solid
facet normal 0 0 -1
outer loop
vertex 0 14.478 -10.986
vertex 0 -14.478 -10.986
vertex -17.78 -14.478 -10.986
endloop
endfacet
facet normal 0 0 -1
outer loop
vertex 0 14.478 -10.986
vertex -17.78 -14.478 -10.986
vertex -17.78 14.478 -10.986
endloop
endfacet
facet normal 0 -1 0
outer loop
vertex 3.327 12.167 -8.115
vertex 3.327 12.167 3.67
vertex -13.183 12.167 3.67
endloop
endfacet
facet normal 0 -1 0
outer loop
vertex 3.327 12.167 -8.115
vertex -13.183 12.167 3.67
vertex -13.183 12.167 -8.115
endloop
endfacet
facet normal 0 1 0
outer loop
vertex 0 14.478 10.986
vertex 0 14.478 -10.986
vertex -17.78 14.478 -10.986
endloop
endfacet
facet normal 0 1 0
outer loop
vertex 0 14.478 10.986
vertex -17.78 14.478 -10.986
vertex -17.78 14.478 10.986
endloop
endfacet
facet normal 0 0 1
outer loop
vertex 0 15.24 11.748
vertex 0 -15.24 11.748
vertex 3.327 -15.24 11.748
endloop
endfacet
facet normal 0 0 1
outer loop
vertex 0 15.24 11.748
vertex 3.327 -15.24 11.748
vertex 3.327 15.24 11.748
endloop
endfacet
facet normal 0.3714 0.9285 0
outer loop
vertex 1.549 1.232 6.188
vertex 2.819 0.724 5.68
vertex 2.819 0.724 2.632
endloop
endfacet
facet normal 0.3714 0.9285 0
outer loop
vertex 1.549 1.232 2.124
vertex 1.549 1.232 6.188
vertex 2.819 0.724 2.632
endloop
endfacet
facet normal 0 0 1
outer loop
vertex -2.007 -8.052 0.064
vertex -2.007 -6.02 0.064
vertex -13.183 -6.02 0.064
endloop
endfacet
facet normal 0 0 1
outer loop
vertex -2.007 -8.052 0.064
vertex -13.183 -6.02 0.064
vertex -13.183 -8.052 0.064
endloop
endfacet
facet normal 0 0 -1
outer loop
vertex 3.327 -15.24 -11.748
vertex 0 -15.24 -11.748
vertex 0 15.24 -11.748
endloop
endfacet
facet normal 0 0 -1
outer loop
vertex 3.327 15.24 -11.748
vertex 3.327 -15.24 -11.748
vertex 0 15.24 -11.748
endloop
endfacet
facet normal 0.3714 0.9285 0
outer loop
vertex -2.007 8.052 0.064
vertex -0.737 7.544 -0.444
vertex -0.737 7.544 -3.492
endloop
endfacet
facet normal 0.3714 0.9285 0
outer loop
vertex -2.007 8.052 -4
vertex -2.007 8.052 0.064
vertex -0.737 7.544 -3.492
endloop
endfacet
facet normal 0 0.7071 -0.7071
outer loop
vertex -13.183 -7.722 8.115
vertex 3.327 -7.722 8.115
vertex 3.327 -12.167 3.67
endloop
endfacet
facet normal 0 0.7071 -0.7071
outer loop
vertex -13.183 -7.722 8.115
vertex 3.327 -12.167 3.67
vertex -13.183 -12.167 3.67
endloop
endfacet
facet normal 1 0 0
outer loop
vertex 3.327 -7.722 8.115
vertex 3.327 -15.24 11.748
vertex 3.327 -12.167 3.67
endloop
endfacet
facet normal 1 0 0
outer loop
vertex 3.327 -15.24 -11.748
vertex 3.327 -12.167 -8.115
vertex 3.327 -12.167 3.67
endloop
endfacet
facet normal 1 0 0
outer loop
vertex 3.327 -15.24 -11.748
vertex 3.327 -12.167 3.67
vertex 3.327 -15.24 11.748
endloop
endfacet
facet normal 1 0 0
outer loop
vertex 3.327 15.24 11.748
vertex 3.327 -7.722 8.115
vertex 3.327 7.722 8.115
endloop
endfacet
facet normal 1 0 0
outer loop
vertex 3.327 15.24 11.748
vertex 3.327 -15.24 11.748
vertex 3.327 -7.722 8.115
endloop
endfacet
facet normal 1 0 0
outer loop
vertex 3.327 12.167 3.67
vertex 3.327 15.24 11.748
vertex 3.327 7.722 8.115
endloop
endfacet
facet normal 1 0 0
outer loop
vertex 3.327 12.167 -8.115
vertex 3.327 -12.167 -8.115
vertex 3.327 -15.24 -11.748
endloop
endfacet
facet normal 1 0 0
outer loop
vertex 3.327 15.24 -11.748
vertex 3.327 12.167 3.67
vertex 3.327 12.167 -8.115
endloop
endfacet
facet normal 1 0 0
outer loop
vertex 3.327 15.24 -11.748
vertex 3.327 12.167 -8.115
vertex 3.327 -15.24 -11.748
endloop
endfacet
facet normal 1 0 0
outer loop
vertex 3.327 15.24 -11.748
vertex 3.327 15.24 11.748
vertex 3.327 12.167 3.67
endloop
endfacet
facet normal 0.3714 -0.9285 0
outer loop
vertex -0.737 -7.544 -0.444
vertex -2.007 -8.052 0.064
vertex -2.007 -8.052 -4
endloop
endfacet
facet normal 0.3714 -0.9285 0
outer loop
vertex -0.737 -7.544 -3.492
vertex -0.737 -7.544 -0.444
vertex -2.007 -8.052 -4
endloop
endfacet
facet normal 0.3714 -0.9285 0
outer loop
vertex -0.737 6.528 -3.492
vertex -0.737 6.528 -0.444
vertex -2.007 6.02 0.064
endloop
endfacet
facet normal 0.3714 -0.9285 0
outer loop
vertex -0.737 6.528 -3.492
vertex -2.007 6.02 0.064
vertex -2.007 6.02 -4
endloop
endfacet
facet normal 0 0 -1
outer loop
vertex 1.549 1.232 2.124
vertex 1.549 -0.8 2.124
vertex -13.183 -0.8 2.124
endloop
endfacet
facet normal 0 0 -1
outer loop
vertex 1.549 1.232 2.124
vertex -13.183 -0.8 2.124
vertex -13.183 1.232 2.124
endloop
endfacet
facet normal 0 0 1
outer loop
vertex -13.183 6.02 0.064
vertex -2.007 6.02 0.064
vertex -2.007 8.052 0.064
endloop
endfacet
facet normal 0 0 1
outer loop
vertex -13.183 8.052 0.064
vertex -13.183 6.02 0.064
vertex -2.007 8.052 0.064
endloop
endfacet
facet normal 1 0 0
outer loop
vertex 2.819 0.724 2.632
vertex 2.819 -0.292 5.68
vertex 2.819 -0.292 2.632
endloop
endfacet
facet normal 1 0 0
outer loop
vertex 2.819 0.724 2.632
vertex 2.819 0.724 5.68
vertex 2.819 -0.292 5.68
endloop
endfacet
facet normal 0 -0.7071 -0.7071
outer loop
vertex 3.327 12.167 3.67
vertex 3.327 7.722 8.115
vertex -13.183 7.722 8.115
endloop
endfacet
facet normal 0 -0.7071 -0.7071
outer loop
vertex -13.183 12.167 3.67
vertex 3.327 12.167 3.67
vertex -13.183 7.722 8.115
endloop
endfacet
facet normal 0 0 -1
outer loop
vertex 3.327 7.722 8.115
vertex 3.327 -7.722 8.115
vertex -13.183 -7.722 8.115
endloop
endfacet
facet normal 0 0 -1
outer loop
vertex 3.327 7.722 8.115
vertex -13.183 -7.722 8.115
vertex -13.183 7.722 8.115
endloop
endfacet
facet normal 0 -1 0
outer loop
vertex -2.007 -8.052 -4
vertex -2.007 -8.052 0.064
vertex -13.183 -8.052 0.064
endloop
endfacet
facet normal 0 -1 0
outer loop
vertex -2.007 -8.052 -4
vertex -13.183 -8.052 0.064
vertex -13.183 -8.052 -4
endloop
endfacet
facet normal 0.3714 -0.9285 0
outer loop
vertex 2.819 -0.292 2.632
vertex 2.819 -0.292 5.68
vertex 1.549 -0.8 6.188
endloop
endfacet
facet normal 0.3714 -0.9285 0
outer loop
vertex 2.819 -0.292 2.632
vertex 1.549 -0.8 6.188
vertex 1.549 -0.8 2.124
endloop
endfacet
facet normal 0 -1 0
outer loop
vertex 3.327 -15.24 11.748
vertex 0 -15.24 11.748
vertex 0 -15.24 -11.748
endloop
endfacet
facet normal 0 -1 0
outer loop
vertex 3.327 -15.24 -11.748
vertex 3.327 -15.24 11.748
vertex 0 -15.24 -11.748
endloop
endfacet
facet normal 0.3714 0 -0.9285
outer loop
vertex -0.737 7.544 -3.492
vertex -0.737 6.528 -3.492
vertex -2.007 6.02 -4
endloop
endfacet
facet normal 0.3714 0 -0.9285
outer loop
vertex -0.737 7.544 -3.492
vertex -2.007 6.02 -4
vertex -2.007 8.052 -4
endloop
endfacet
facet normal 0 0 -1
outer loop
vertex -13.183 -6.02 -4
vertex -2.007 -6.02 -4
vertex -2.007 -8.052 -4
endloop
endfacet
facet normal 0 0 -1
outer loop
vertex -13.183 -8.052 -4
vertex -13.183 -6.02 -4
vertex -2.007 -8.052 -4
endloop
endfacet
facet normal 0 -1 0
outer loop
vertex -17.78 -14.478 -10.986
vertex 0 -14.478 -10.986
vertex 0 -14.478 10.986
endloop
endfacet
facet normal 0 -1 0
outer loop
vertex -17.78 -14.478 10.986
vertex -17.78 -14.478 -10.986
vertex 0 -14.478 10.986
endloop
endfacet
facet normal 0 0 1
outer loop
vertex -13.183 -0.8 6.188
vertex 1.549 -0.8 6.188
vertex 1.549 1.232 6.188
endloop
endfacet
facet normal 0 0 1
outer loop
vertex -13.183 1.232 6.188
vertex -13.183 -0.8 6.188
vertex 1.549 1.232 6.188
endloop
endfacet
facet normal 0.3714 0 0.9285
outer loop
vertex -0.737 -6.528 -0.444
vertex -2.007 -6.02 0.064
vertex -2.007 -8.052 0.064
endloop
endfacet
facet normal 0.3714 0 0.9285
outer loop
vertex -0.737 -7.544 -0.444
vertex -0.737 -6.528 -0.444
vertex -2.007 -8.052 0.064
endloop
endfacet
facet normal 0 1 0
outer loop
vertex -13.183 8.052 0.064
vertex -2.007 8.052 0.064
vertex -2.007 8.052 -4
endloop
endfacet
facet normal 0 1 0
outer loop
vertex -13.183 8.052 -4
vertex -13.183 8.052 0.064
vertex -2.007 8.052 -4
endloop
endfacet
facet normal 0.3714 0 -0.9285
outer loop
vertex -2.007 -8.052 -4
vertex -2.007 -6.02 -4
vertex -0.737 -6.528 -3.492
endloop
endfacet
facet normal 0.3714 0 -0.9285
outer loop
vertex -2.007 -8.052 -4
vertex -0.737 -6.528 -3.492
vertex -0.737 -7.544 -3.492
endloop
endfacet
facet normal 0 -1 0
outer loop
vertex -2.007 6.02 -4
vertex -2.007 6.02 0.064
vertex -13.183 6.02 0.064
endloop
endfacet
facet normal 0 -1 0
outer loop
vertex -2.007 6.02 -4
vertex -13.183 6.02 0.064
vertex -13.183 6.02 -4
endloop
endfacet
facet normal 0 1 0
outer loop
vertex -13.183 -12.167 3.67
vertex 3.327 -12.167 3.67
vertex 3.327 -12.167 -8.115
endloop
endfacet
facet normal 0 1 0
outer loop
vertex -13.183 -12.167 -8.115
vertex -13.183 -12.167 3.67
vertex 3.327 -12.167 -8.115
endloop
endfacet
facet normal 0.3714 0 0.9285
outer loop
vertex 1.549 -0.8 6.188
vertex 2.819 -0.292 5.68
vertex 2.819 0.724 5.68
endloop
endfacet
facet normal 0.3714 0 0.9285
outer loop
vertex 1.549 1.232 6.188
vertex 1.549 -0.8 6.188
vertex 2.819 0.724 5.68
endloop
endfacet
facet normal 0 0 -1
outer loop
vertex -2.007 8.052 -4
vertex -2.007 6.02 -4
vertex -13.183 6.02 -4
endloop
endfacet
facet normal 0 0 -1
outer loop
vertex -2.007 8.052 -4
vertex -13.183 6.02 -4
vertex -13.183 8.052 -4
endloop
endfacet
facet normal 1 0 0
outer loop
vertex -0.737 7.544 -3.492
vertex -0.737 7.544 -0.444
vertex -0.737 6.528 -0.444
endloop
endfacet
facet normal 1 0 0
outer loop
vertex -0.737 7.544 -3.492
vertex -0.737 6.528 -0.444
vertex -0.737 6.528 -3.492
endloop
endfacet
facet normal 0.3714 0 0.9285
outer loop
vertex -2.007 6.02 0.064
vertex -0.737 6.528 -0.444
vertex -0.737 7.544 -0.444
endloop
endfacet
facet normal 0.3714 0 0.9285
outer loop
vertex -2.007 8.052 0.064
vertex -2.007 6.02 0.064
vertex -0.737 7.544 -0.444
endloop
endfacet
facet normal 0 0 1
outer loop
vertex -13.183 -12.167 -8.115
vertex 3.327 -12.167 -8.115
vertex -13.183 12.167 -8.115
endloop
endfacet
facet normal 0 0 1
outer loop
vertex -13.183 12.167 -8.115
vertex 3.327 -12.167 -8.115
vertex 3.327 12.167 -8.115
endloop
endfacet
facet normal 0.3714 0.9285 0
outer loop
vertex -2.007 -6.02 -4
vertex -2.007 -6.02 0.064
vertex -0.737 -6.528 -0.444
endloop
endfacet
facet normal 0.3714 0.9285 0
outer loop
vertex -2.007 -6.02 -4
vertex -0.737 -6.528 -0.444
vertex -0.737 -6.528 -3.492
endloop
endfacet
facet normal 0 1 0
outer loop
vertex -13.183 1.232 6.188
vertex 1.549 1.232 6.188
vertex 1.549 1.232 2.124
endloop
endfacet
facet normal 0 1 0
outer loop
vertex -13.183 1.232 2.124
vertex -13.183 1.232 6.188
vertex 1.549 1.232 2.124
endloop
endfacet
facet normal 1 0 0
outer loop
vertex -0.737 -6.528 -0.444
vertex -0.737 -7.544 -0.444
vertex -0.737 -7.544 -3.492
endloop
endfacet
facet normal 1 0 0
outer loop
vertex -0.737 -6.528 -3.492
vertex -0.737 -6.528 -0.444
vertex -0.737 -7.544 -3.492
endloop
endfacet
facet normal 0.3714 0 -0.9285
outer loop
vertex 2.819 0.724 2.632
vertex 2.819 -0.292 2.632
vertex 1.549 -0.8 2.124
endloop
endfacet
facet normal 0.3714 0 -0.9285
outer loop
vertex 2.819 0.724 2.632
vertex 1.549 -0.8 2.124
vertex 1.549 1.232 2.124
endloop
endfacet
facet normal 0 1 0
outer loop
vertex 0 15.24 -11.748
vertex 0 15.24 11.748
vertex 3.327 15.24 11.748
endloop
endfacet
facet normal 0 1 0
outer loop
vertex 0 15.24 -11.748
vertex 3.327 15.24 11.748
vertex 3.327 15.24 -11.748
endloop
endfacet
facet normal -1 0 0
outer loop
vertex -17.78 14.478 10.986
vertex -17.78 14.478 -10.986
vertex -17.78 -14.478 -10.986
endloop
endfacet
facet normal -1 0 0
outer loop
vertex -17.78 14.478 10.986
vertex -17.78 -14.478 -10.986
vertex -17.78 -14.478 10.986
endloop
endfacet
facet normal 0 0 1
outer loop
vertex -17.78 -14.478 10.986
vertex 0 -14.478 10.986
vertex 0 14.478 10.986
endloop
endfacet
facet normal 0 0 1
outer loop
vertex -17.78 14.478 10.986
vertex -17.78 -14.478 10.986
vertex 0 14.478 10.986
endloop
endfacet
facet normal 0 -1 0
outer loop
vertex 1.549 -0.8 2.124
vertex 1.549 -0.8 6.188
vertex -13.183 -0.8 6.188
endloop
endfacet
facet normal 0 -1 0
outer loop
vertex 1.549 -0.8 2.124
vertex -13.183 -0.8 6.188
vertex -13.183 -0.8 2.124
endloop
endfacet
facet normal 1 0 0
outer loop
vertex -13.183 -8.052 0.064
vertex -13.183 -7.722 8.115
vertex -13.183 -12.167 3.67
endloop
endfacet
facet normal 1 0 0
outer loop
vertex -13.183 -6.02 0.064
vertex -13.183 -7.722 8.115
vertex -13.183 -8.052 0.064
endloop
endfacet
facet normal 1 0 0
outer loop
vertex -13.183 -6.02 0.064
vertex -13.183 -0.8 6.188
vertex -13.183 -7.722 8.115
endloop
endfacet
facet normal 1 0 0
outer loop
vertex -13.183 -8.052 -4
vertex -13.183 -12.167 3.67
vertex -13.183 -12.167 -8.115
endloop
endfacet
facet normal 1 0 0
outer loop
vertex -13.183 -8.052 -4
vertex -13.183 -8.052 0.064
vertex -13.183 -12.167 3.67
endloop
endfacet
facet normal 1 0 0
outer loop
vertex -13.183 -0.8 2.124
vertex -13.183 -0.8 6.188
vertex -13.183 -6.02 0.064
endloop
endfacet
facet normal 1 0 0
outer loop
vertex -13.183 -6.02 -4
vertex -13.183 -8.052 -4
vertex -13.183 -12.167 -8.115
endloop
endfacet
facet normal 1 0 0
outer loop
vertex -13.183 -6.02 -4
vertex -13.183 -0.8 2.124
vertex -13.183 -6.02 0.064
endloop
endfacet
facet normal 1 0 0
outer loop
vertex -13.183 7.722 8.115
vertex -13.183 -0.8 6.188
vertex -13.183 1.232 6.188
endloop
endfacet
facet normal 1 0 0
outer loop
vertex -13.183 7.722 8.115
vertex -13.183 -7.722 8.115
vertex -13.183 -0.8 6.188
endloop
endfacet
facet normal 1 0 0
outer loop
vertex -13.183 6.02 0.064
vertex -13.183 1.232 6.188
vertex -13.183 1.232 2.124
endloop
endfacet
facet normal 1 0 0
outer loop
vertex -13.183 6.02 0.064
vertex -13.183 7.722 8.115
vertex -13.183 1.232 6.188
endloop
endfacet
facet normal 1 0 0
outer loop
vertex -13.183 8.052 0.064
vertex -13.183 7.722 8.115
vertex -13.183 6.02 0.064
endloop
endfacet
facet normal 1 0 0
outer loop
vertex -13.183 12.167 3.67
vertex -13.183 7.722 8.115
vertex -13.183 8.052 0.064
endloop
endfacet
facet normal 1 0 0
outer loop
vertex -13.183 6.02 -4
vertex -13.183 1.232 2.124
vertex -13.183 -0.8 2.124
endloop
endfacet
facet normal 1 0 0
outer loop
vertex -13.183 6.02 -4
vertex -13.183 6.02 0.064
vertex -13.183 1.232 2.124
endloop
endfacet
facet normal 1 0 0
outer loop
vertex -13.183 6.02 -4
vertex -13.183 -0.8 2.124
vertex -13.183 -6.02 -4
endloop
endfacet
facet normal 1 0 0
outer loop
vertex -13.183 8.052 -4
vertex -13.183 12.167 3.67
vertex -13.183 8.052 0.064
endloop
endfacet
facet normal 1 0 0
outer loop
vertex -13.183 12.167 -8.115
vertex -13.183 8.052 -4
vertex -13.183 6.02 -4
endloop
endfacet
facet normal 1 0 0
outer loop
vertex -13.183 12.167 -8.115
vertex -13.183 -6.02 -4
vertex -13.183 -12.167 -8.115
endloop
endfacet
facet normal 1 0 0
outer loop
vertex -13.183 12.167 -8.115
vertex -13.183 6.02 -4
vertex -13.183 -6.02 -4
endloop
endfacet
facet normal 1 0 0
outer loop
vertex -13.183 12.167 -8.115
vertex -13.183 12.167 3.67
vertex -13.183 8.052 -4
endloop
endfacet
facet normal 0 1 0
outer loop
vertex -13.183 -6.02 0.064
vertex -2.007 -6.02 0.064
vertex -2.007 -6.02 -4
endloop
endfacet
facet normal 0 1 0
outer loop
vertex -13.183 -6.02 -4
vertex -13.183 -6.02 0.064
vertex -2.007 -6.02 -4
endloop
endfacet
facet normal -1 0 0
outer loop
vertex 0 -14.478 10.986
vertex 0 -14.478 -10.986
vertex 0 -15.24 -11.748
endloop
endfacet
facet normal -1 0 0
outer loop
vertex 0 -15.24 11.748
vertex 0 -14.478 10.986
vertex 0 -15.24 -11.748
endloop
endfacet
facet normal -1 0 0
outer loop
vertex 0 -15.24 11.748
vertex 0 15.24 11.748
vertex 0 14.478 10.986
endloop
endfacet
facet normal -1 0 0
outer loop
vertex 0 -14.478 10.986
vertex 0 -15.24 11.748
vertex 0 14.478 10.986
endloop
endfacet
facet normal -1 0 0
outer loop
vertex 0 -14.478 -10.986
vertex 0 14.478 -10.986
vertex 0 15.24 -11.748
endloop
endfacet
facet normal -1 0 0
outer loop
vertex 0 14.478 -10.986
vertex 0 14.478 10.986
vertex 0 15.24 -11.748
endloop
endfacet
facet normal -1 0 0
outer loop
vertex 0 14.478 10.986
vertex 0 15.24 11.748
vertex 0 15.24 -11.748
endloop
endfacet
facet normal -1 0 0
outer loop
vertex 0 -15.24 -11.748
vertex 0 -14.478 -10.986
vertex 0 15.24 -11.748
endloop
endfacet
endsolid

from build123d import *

# Parameters (mm, degrees)
SKETCH1_W             = 23.495
SKETCH1_H             = 30.48
BOSS_EXTRUDE1_DEPTH   = 3.3274
SKETCH2_W             = 21.971
SKETCH2_H             = 28.956
BOSS_EXTRUDE2_DEPTH   = 17.78
SKETCH3_W             = 16.2306
SKETCH3_H             = 24.3332
CUT_EXTRUDE1_DEPTH    = 16.51
CHAMFER1_SIZE         = 4.445
SKETCH4_W             = 4.064
SKETCH4_H             = 2.032
BOSS_EXTRUDE3_DEPTH   = 16.002
CHAMFER2_SIZE         = 1.27
CHAMFER2_SIZE2        = 0.508
CHAMFER2_PART_2_SIZE  = 1.27
CHAMFER2_PART_2_SIZE2 = 0.508
CHAMFER3_SIZE         = 1.27
CHAMFER3_SIZE2        = 0.508
CHAMFER3_PART_2_SIZE  = 1.27
CHAMFER3_PART_2_SIZE2 = 0.508
SKETCH5_W             = 4.064
SKETCH5_H             = 2.032
BOSS_EXTRUDE4_DEPTH   = 12.446
CHAMFER4_SIZE         = 1.27
CHAMFER4_SIZE2        = 0.508
CHAMFER4_PART_2_SIZE  = 1.27
CHAMFER4_PART_2_SIZE2 = 0.508
CHAMFER4_PART_3_SIZE  = 1.27
CHAMFER4_PART_3_SIZE2 = 0.508
CHAMFER4_PART_4_SIZE  = 1.27
CHAMFER4_PART_4_SIZE2 = 0.508
CHAMFER5_SIZE         = 0.508
CHAMFER5_SIZE2        = 1.27


with BuildPart() as part:
    # Sketch1 → Boss-Extrude1 (new body)
    with BuildSketch(Plane(origin=(0, 0, 0), x_dir=(0, 0, -1), z_dir=(1, 0, 0))):
        Rectangle(SKETCH1_W, SKETCH1_H)
    extrude(amount=BOSS_EXTRUDE1_DEPTH)

    # Sketch2 → Boss-Extrude2 (add)
    with BuildSketch(Plane.ZY):
        Rectangle(SKETCH2_W, SKETCH2_H)
    extrude(amount=BOSS_EXTRUDE2_DEPTH)

    # Sketch3 → Cut-Extrude1 (cut)
    with BuildSketch(Plane(origin=(3.3274, 0, 0), x_dir=(0, 0, -1), z_dir=(1, 0, 0))):
        Rectangle(SKETCH3_W, SKETCH3_H)
    extrude(amount=-CUT_EXTRUDE1_DEPTH, mode=Mode.SUBTRACT)

    # Chamfer1
    chamfer1_edges = [part.edges().sort_by_distance(p)[0] for p in [
        (-4.9276, -12.1666, 8.1153),
        (-4.9276, 12.1666, 8.1153),
    ]]
    chamfer(chamfer1_edges, length=CHAMFER1_SIZE)

    # Sketch4 → Boss-Extrude3 (add)
    with BuildSketch(Plane(origin=(2.8194, 0, 0), x_dir=(0, 0, -1), z_dir=(1, 0, 0))):
        with Locations((-4.155513801, 0.215773581)):
            Rectangle(SKETCH4_W, SKETCH4_H)
    extrude(amount=-BOSS_EXTRUDE3_DEPTH)

    # Chamfer2
    chamfer2_edges = [part.edges().sort_by_distance(p)[0] for p in [
        (2.8194, 1.231773581, 4.155513801),
    ]]
    chamfer2_side = [part.faces().sort_by_distance(p)[0] for p in [
        (-5.1816, 1.231773581, 4.155513801),
    ]]
    chamfer(chamfer2_edges, length=CHAMFER2_SIZE, length2=CHAMFER2_SIZE2, reference=chamfer2_side[0])

    # Chamfer2 part 2
    chamfer2_part_2_edges = [part.edges().sort_by_distance(p)[0] for p in [
        (2.8194, -0.800226419, 4.155513801),
    ]]
    chamfer2_part_2_side = [part.faces().sort_by_distance(p)[0] for p in [
        (-5.1816, -0.800226419, 4.155513801),
    ]]
    chamfer(chamfer2_part_2_edges, length=CHAMFER2_PART_2_SIZE, length2=CHAMFER2_PART_2_SIZE2, reference=chamfer2_part_2_side[0])

    # Chamfer3
    chamfer3_edges = [part.edges().sort_by_distance(p)[0] for p in [
        (2.8194, 0.215773581, 2.123513801),
    ]]
    chamfer3_side = [part.faces().sort_by_distance(p)[0] for p in [
        (-5.334994062, 0.215773581, 2.123513801),
    ]]
    chamfer(chamfer3_edges, length=CHAMFER3_SIZE, length2=CHAMFER3_SIZE2, reference=chamfer3_side[0])

    # Chamfer3 part 2
    chamfer3_part_2_edges = [part.edges().sort_by_distance(p)[0] for p in [
        (2.8194, 0.215773581, 6.187513801),
    ]]
    chamfer3_part_2_side = [part.faces().sort_by_distance(p)[0] for p in [
        (-5.334994062, 0.215773581, 6.187513801),
    ]]
    chamfer(chamfer3_part_2_edges, length=CHAMFER3_PART_2_SIZE, length2=CHAMFER3_PART_2_SIZE2, reference=chamfer3_part_2_side[0])

    # Sketch5 → Boss-Extrude4 (add)
    with BuildSketch(Plane(origin=(-0.7366, 0, 0), x_dir=(0, 0, -1), z_dir=(1, 0, 0))):
        with Locations((1.9685, 7.0358)):
            Rectangle(SKETCH5_W, SKETCH5_H)
    boss_extrude4 = extrude(amount=-BOSS_EXTRUDE4_DEPTH)

    # Chamfer4
    chamfer4_edges = [part.edges().sort_by_distance(p)[0] for p in [
        (-0.7366, 7.0358, -4.0005),
    ]]
    chamfer4_side = [part.faces().sort_by_distance(p)[0] for p in [
        (-6.9596, 7.0358, -4.0005),
    ]]
    chamfer(chamfer4_edges, length=CHAMFER4_SIZE, length2=CHAMFER4_SIZE2, reference=chamfer4_side[0])

    # Chamfer4 part 2
    chamfer4_part_2_edges = [part.edges().sort_by_distance(p)[0] for p in [
        (-0.7366, 8.0518, -1.9685),
    ]]
    chamfer4_part_2_side = [part.faces().sort_by_distance(p)[0] for p in [
        (-6.9596, 8.0518, -1.9685),
    ]]
    chamfer(chamfer4_part_2_edges, length=CHAMFER4_PART_2_SIZE, length2=CHAMFER4_PART_2_SIZE2, reference=chamfer4_part_2_side[0])

    # Chamfer4 part 3
    chamfer4_part_3_edges = [part.edges().sort_by_distance(p)[0] for p in [
        (-0.7366, 7.0358, 0.0635),
    ]]
    chamfer4_part_3_side = [part.faces().sort_by_distance(p)[0] for p in [
        (-6.9596, 7.0358, 0.0635),
    ]]
    chamfer(chamfer4_part_3_edges, length=CHAMFER4_PART_3_SIZE, length2=CHAMFER4_PART_3_SIZE2, reference=chamfer4_part_3_side[0])

    # Chamfer4 part 4
    chamfer4_part_4_edges = [part.edges().sort_by_distance(p)[0] for p in [
        (-0.7366, 6.0198, -1.9685),
    ]]
    chamfer4_part_4_side = [part.faces().sort_by_distance(p)[0] for p in [
        (-6.9596, 6.0198, -1.9685),
    ]]
    chamfer(chamfer4_part_4_edges, length=CHAMFER4_PART_4_SIZE, length2=CHAMFER4_PART_4_SIZE2, reference=chamfer4_part_4_side[0])

    # Mirror7: Boss-Extrude4 across plane
    add(boss_extrude4.mirror(Plane.ZX))

    # Chamfer5
    chamfer5_edges = [part.edges().sort_by_distance(p)[0] for p in [
        (-0.7366, -7.0358, -4.0005),
        (-0.7366, -8.0518, -1.9685),
        (-0.7366, -7.0358, 0.0635),
        (-0.7366, -6.0198, -1.9685),
    ]]
    chamfer5_side = [part.faces().sort_by_distance(p)[0] for p in [
        (-0.7366, -7.0358, -1.9685),
    ]]
    chamfer(chamfer5_edges, length=CHAMFER5_SIZE, length2=CHAMFER5_SIZE2, reference=chamfer5_side[0])


solid = part.part
